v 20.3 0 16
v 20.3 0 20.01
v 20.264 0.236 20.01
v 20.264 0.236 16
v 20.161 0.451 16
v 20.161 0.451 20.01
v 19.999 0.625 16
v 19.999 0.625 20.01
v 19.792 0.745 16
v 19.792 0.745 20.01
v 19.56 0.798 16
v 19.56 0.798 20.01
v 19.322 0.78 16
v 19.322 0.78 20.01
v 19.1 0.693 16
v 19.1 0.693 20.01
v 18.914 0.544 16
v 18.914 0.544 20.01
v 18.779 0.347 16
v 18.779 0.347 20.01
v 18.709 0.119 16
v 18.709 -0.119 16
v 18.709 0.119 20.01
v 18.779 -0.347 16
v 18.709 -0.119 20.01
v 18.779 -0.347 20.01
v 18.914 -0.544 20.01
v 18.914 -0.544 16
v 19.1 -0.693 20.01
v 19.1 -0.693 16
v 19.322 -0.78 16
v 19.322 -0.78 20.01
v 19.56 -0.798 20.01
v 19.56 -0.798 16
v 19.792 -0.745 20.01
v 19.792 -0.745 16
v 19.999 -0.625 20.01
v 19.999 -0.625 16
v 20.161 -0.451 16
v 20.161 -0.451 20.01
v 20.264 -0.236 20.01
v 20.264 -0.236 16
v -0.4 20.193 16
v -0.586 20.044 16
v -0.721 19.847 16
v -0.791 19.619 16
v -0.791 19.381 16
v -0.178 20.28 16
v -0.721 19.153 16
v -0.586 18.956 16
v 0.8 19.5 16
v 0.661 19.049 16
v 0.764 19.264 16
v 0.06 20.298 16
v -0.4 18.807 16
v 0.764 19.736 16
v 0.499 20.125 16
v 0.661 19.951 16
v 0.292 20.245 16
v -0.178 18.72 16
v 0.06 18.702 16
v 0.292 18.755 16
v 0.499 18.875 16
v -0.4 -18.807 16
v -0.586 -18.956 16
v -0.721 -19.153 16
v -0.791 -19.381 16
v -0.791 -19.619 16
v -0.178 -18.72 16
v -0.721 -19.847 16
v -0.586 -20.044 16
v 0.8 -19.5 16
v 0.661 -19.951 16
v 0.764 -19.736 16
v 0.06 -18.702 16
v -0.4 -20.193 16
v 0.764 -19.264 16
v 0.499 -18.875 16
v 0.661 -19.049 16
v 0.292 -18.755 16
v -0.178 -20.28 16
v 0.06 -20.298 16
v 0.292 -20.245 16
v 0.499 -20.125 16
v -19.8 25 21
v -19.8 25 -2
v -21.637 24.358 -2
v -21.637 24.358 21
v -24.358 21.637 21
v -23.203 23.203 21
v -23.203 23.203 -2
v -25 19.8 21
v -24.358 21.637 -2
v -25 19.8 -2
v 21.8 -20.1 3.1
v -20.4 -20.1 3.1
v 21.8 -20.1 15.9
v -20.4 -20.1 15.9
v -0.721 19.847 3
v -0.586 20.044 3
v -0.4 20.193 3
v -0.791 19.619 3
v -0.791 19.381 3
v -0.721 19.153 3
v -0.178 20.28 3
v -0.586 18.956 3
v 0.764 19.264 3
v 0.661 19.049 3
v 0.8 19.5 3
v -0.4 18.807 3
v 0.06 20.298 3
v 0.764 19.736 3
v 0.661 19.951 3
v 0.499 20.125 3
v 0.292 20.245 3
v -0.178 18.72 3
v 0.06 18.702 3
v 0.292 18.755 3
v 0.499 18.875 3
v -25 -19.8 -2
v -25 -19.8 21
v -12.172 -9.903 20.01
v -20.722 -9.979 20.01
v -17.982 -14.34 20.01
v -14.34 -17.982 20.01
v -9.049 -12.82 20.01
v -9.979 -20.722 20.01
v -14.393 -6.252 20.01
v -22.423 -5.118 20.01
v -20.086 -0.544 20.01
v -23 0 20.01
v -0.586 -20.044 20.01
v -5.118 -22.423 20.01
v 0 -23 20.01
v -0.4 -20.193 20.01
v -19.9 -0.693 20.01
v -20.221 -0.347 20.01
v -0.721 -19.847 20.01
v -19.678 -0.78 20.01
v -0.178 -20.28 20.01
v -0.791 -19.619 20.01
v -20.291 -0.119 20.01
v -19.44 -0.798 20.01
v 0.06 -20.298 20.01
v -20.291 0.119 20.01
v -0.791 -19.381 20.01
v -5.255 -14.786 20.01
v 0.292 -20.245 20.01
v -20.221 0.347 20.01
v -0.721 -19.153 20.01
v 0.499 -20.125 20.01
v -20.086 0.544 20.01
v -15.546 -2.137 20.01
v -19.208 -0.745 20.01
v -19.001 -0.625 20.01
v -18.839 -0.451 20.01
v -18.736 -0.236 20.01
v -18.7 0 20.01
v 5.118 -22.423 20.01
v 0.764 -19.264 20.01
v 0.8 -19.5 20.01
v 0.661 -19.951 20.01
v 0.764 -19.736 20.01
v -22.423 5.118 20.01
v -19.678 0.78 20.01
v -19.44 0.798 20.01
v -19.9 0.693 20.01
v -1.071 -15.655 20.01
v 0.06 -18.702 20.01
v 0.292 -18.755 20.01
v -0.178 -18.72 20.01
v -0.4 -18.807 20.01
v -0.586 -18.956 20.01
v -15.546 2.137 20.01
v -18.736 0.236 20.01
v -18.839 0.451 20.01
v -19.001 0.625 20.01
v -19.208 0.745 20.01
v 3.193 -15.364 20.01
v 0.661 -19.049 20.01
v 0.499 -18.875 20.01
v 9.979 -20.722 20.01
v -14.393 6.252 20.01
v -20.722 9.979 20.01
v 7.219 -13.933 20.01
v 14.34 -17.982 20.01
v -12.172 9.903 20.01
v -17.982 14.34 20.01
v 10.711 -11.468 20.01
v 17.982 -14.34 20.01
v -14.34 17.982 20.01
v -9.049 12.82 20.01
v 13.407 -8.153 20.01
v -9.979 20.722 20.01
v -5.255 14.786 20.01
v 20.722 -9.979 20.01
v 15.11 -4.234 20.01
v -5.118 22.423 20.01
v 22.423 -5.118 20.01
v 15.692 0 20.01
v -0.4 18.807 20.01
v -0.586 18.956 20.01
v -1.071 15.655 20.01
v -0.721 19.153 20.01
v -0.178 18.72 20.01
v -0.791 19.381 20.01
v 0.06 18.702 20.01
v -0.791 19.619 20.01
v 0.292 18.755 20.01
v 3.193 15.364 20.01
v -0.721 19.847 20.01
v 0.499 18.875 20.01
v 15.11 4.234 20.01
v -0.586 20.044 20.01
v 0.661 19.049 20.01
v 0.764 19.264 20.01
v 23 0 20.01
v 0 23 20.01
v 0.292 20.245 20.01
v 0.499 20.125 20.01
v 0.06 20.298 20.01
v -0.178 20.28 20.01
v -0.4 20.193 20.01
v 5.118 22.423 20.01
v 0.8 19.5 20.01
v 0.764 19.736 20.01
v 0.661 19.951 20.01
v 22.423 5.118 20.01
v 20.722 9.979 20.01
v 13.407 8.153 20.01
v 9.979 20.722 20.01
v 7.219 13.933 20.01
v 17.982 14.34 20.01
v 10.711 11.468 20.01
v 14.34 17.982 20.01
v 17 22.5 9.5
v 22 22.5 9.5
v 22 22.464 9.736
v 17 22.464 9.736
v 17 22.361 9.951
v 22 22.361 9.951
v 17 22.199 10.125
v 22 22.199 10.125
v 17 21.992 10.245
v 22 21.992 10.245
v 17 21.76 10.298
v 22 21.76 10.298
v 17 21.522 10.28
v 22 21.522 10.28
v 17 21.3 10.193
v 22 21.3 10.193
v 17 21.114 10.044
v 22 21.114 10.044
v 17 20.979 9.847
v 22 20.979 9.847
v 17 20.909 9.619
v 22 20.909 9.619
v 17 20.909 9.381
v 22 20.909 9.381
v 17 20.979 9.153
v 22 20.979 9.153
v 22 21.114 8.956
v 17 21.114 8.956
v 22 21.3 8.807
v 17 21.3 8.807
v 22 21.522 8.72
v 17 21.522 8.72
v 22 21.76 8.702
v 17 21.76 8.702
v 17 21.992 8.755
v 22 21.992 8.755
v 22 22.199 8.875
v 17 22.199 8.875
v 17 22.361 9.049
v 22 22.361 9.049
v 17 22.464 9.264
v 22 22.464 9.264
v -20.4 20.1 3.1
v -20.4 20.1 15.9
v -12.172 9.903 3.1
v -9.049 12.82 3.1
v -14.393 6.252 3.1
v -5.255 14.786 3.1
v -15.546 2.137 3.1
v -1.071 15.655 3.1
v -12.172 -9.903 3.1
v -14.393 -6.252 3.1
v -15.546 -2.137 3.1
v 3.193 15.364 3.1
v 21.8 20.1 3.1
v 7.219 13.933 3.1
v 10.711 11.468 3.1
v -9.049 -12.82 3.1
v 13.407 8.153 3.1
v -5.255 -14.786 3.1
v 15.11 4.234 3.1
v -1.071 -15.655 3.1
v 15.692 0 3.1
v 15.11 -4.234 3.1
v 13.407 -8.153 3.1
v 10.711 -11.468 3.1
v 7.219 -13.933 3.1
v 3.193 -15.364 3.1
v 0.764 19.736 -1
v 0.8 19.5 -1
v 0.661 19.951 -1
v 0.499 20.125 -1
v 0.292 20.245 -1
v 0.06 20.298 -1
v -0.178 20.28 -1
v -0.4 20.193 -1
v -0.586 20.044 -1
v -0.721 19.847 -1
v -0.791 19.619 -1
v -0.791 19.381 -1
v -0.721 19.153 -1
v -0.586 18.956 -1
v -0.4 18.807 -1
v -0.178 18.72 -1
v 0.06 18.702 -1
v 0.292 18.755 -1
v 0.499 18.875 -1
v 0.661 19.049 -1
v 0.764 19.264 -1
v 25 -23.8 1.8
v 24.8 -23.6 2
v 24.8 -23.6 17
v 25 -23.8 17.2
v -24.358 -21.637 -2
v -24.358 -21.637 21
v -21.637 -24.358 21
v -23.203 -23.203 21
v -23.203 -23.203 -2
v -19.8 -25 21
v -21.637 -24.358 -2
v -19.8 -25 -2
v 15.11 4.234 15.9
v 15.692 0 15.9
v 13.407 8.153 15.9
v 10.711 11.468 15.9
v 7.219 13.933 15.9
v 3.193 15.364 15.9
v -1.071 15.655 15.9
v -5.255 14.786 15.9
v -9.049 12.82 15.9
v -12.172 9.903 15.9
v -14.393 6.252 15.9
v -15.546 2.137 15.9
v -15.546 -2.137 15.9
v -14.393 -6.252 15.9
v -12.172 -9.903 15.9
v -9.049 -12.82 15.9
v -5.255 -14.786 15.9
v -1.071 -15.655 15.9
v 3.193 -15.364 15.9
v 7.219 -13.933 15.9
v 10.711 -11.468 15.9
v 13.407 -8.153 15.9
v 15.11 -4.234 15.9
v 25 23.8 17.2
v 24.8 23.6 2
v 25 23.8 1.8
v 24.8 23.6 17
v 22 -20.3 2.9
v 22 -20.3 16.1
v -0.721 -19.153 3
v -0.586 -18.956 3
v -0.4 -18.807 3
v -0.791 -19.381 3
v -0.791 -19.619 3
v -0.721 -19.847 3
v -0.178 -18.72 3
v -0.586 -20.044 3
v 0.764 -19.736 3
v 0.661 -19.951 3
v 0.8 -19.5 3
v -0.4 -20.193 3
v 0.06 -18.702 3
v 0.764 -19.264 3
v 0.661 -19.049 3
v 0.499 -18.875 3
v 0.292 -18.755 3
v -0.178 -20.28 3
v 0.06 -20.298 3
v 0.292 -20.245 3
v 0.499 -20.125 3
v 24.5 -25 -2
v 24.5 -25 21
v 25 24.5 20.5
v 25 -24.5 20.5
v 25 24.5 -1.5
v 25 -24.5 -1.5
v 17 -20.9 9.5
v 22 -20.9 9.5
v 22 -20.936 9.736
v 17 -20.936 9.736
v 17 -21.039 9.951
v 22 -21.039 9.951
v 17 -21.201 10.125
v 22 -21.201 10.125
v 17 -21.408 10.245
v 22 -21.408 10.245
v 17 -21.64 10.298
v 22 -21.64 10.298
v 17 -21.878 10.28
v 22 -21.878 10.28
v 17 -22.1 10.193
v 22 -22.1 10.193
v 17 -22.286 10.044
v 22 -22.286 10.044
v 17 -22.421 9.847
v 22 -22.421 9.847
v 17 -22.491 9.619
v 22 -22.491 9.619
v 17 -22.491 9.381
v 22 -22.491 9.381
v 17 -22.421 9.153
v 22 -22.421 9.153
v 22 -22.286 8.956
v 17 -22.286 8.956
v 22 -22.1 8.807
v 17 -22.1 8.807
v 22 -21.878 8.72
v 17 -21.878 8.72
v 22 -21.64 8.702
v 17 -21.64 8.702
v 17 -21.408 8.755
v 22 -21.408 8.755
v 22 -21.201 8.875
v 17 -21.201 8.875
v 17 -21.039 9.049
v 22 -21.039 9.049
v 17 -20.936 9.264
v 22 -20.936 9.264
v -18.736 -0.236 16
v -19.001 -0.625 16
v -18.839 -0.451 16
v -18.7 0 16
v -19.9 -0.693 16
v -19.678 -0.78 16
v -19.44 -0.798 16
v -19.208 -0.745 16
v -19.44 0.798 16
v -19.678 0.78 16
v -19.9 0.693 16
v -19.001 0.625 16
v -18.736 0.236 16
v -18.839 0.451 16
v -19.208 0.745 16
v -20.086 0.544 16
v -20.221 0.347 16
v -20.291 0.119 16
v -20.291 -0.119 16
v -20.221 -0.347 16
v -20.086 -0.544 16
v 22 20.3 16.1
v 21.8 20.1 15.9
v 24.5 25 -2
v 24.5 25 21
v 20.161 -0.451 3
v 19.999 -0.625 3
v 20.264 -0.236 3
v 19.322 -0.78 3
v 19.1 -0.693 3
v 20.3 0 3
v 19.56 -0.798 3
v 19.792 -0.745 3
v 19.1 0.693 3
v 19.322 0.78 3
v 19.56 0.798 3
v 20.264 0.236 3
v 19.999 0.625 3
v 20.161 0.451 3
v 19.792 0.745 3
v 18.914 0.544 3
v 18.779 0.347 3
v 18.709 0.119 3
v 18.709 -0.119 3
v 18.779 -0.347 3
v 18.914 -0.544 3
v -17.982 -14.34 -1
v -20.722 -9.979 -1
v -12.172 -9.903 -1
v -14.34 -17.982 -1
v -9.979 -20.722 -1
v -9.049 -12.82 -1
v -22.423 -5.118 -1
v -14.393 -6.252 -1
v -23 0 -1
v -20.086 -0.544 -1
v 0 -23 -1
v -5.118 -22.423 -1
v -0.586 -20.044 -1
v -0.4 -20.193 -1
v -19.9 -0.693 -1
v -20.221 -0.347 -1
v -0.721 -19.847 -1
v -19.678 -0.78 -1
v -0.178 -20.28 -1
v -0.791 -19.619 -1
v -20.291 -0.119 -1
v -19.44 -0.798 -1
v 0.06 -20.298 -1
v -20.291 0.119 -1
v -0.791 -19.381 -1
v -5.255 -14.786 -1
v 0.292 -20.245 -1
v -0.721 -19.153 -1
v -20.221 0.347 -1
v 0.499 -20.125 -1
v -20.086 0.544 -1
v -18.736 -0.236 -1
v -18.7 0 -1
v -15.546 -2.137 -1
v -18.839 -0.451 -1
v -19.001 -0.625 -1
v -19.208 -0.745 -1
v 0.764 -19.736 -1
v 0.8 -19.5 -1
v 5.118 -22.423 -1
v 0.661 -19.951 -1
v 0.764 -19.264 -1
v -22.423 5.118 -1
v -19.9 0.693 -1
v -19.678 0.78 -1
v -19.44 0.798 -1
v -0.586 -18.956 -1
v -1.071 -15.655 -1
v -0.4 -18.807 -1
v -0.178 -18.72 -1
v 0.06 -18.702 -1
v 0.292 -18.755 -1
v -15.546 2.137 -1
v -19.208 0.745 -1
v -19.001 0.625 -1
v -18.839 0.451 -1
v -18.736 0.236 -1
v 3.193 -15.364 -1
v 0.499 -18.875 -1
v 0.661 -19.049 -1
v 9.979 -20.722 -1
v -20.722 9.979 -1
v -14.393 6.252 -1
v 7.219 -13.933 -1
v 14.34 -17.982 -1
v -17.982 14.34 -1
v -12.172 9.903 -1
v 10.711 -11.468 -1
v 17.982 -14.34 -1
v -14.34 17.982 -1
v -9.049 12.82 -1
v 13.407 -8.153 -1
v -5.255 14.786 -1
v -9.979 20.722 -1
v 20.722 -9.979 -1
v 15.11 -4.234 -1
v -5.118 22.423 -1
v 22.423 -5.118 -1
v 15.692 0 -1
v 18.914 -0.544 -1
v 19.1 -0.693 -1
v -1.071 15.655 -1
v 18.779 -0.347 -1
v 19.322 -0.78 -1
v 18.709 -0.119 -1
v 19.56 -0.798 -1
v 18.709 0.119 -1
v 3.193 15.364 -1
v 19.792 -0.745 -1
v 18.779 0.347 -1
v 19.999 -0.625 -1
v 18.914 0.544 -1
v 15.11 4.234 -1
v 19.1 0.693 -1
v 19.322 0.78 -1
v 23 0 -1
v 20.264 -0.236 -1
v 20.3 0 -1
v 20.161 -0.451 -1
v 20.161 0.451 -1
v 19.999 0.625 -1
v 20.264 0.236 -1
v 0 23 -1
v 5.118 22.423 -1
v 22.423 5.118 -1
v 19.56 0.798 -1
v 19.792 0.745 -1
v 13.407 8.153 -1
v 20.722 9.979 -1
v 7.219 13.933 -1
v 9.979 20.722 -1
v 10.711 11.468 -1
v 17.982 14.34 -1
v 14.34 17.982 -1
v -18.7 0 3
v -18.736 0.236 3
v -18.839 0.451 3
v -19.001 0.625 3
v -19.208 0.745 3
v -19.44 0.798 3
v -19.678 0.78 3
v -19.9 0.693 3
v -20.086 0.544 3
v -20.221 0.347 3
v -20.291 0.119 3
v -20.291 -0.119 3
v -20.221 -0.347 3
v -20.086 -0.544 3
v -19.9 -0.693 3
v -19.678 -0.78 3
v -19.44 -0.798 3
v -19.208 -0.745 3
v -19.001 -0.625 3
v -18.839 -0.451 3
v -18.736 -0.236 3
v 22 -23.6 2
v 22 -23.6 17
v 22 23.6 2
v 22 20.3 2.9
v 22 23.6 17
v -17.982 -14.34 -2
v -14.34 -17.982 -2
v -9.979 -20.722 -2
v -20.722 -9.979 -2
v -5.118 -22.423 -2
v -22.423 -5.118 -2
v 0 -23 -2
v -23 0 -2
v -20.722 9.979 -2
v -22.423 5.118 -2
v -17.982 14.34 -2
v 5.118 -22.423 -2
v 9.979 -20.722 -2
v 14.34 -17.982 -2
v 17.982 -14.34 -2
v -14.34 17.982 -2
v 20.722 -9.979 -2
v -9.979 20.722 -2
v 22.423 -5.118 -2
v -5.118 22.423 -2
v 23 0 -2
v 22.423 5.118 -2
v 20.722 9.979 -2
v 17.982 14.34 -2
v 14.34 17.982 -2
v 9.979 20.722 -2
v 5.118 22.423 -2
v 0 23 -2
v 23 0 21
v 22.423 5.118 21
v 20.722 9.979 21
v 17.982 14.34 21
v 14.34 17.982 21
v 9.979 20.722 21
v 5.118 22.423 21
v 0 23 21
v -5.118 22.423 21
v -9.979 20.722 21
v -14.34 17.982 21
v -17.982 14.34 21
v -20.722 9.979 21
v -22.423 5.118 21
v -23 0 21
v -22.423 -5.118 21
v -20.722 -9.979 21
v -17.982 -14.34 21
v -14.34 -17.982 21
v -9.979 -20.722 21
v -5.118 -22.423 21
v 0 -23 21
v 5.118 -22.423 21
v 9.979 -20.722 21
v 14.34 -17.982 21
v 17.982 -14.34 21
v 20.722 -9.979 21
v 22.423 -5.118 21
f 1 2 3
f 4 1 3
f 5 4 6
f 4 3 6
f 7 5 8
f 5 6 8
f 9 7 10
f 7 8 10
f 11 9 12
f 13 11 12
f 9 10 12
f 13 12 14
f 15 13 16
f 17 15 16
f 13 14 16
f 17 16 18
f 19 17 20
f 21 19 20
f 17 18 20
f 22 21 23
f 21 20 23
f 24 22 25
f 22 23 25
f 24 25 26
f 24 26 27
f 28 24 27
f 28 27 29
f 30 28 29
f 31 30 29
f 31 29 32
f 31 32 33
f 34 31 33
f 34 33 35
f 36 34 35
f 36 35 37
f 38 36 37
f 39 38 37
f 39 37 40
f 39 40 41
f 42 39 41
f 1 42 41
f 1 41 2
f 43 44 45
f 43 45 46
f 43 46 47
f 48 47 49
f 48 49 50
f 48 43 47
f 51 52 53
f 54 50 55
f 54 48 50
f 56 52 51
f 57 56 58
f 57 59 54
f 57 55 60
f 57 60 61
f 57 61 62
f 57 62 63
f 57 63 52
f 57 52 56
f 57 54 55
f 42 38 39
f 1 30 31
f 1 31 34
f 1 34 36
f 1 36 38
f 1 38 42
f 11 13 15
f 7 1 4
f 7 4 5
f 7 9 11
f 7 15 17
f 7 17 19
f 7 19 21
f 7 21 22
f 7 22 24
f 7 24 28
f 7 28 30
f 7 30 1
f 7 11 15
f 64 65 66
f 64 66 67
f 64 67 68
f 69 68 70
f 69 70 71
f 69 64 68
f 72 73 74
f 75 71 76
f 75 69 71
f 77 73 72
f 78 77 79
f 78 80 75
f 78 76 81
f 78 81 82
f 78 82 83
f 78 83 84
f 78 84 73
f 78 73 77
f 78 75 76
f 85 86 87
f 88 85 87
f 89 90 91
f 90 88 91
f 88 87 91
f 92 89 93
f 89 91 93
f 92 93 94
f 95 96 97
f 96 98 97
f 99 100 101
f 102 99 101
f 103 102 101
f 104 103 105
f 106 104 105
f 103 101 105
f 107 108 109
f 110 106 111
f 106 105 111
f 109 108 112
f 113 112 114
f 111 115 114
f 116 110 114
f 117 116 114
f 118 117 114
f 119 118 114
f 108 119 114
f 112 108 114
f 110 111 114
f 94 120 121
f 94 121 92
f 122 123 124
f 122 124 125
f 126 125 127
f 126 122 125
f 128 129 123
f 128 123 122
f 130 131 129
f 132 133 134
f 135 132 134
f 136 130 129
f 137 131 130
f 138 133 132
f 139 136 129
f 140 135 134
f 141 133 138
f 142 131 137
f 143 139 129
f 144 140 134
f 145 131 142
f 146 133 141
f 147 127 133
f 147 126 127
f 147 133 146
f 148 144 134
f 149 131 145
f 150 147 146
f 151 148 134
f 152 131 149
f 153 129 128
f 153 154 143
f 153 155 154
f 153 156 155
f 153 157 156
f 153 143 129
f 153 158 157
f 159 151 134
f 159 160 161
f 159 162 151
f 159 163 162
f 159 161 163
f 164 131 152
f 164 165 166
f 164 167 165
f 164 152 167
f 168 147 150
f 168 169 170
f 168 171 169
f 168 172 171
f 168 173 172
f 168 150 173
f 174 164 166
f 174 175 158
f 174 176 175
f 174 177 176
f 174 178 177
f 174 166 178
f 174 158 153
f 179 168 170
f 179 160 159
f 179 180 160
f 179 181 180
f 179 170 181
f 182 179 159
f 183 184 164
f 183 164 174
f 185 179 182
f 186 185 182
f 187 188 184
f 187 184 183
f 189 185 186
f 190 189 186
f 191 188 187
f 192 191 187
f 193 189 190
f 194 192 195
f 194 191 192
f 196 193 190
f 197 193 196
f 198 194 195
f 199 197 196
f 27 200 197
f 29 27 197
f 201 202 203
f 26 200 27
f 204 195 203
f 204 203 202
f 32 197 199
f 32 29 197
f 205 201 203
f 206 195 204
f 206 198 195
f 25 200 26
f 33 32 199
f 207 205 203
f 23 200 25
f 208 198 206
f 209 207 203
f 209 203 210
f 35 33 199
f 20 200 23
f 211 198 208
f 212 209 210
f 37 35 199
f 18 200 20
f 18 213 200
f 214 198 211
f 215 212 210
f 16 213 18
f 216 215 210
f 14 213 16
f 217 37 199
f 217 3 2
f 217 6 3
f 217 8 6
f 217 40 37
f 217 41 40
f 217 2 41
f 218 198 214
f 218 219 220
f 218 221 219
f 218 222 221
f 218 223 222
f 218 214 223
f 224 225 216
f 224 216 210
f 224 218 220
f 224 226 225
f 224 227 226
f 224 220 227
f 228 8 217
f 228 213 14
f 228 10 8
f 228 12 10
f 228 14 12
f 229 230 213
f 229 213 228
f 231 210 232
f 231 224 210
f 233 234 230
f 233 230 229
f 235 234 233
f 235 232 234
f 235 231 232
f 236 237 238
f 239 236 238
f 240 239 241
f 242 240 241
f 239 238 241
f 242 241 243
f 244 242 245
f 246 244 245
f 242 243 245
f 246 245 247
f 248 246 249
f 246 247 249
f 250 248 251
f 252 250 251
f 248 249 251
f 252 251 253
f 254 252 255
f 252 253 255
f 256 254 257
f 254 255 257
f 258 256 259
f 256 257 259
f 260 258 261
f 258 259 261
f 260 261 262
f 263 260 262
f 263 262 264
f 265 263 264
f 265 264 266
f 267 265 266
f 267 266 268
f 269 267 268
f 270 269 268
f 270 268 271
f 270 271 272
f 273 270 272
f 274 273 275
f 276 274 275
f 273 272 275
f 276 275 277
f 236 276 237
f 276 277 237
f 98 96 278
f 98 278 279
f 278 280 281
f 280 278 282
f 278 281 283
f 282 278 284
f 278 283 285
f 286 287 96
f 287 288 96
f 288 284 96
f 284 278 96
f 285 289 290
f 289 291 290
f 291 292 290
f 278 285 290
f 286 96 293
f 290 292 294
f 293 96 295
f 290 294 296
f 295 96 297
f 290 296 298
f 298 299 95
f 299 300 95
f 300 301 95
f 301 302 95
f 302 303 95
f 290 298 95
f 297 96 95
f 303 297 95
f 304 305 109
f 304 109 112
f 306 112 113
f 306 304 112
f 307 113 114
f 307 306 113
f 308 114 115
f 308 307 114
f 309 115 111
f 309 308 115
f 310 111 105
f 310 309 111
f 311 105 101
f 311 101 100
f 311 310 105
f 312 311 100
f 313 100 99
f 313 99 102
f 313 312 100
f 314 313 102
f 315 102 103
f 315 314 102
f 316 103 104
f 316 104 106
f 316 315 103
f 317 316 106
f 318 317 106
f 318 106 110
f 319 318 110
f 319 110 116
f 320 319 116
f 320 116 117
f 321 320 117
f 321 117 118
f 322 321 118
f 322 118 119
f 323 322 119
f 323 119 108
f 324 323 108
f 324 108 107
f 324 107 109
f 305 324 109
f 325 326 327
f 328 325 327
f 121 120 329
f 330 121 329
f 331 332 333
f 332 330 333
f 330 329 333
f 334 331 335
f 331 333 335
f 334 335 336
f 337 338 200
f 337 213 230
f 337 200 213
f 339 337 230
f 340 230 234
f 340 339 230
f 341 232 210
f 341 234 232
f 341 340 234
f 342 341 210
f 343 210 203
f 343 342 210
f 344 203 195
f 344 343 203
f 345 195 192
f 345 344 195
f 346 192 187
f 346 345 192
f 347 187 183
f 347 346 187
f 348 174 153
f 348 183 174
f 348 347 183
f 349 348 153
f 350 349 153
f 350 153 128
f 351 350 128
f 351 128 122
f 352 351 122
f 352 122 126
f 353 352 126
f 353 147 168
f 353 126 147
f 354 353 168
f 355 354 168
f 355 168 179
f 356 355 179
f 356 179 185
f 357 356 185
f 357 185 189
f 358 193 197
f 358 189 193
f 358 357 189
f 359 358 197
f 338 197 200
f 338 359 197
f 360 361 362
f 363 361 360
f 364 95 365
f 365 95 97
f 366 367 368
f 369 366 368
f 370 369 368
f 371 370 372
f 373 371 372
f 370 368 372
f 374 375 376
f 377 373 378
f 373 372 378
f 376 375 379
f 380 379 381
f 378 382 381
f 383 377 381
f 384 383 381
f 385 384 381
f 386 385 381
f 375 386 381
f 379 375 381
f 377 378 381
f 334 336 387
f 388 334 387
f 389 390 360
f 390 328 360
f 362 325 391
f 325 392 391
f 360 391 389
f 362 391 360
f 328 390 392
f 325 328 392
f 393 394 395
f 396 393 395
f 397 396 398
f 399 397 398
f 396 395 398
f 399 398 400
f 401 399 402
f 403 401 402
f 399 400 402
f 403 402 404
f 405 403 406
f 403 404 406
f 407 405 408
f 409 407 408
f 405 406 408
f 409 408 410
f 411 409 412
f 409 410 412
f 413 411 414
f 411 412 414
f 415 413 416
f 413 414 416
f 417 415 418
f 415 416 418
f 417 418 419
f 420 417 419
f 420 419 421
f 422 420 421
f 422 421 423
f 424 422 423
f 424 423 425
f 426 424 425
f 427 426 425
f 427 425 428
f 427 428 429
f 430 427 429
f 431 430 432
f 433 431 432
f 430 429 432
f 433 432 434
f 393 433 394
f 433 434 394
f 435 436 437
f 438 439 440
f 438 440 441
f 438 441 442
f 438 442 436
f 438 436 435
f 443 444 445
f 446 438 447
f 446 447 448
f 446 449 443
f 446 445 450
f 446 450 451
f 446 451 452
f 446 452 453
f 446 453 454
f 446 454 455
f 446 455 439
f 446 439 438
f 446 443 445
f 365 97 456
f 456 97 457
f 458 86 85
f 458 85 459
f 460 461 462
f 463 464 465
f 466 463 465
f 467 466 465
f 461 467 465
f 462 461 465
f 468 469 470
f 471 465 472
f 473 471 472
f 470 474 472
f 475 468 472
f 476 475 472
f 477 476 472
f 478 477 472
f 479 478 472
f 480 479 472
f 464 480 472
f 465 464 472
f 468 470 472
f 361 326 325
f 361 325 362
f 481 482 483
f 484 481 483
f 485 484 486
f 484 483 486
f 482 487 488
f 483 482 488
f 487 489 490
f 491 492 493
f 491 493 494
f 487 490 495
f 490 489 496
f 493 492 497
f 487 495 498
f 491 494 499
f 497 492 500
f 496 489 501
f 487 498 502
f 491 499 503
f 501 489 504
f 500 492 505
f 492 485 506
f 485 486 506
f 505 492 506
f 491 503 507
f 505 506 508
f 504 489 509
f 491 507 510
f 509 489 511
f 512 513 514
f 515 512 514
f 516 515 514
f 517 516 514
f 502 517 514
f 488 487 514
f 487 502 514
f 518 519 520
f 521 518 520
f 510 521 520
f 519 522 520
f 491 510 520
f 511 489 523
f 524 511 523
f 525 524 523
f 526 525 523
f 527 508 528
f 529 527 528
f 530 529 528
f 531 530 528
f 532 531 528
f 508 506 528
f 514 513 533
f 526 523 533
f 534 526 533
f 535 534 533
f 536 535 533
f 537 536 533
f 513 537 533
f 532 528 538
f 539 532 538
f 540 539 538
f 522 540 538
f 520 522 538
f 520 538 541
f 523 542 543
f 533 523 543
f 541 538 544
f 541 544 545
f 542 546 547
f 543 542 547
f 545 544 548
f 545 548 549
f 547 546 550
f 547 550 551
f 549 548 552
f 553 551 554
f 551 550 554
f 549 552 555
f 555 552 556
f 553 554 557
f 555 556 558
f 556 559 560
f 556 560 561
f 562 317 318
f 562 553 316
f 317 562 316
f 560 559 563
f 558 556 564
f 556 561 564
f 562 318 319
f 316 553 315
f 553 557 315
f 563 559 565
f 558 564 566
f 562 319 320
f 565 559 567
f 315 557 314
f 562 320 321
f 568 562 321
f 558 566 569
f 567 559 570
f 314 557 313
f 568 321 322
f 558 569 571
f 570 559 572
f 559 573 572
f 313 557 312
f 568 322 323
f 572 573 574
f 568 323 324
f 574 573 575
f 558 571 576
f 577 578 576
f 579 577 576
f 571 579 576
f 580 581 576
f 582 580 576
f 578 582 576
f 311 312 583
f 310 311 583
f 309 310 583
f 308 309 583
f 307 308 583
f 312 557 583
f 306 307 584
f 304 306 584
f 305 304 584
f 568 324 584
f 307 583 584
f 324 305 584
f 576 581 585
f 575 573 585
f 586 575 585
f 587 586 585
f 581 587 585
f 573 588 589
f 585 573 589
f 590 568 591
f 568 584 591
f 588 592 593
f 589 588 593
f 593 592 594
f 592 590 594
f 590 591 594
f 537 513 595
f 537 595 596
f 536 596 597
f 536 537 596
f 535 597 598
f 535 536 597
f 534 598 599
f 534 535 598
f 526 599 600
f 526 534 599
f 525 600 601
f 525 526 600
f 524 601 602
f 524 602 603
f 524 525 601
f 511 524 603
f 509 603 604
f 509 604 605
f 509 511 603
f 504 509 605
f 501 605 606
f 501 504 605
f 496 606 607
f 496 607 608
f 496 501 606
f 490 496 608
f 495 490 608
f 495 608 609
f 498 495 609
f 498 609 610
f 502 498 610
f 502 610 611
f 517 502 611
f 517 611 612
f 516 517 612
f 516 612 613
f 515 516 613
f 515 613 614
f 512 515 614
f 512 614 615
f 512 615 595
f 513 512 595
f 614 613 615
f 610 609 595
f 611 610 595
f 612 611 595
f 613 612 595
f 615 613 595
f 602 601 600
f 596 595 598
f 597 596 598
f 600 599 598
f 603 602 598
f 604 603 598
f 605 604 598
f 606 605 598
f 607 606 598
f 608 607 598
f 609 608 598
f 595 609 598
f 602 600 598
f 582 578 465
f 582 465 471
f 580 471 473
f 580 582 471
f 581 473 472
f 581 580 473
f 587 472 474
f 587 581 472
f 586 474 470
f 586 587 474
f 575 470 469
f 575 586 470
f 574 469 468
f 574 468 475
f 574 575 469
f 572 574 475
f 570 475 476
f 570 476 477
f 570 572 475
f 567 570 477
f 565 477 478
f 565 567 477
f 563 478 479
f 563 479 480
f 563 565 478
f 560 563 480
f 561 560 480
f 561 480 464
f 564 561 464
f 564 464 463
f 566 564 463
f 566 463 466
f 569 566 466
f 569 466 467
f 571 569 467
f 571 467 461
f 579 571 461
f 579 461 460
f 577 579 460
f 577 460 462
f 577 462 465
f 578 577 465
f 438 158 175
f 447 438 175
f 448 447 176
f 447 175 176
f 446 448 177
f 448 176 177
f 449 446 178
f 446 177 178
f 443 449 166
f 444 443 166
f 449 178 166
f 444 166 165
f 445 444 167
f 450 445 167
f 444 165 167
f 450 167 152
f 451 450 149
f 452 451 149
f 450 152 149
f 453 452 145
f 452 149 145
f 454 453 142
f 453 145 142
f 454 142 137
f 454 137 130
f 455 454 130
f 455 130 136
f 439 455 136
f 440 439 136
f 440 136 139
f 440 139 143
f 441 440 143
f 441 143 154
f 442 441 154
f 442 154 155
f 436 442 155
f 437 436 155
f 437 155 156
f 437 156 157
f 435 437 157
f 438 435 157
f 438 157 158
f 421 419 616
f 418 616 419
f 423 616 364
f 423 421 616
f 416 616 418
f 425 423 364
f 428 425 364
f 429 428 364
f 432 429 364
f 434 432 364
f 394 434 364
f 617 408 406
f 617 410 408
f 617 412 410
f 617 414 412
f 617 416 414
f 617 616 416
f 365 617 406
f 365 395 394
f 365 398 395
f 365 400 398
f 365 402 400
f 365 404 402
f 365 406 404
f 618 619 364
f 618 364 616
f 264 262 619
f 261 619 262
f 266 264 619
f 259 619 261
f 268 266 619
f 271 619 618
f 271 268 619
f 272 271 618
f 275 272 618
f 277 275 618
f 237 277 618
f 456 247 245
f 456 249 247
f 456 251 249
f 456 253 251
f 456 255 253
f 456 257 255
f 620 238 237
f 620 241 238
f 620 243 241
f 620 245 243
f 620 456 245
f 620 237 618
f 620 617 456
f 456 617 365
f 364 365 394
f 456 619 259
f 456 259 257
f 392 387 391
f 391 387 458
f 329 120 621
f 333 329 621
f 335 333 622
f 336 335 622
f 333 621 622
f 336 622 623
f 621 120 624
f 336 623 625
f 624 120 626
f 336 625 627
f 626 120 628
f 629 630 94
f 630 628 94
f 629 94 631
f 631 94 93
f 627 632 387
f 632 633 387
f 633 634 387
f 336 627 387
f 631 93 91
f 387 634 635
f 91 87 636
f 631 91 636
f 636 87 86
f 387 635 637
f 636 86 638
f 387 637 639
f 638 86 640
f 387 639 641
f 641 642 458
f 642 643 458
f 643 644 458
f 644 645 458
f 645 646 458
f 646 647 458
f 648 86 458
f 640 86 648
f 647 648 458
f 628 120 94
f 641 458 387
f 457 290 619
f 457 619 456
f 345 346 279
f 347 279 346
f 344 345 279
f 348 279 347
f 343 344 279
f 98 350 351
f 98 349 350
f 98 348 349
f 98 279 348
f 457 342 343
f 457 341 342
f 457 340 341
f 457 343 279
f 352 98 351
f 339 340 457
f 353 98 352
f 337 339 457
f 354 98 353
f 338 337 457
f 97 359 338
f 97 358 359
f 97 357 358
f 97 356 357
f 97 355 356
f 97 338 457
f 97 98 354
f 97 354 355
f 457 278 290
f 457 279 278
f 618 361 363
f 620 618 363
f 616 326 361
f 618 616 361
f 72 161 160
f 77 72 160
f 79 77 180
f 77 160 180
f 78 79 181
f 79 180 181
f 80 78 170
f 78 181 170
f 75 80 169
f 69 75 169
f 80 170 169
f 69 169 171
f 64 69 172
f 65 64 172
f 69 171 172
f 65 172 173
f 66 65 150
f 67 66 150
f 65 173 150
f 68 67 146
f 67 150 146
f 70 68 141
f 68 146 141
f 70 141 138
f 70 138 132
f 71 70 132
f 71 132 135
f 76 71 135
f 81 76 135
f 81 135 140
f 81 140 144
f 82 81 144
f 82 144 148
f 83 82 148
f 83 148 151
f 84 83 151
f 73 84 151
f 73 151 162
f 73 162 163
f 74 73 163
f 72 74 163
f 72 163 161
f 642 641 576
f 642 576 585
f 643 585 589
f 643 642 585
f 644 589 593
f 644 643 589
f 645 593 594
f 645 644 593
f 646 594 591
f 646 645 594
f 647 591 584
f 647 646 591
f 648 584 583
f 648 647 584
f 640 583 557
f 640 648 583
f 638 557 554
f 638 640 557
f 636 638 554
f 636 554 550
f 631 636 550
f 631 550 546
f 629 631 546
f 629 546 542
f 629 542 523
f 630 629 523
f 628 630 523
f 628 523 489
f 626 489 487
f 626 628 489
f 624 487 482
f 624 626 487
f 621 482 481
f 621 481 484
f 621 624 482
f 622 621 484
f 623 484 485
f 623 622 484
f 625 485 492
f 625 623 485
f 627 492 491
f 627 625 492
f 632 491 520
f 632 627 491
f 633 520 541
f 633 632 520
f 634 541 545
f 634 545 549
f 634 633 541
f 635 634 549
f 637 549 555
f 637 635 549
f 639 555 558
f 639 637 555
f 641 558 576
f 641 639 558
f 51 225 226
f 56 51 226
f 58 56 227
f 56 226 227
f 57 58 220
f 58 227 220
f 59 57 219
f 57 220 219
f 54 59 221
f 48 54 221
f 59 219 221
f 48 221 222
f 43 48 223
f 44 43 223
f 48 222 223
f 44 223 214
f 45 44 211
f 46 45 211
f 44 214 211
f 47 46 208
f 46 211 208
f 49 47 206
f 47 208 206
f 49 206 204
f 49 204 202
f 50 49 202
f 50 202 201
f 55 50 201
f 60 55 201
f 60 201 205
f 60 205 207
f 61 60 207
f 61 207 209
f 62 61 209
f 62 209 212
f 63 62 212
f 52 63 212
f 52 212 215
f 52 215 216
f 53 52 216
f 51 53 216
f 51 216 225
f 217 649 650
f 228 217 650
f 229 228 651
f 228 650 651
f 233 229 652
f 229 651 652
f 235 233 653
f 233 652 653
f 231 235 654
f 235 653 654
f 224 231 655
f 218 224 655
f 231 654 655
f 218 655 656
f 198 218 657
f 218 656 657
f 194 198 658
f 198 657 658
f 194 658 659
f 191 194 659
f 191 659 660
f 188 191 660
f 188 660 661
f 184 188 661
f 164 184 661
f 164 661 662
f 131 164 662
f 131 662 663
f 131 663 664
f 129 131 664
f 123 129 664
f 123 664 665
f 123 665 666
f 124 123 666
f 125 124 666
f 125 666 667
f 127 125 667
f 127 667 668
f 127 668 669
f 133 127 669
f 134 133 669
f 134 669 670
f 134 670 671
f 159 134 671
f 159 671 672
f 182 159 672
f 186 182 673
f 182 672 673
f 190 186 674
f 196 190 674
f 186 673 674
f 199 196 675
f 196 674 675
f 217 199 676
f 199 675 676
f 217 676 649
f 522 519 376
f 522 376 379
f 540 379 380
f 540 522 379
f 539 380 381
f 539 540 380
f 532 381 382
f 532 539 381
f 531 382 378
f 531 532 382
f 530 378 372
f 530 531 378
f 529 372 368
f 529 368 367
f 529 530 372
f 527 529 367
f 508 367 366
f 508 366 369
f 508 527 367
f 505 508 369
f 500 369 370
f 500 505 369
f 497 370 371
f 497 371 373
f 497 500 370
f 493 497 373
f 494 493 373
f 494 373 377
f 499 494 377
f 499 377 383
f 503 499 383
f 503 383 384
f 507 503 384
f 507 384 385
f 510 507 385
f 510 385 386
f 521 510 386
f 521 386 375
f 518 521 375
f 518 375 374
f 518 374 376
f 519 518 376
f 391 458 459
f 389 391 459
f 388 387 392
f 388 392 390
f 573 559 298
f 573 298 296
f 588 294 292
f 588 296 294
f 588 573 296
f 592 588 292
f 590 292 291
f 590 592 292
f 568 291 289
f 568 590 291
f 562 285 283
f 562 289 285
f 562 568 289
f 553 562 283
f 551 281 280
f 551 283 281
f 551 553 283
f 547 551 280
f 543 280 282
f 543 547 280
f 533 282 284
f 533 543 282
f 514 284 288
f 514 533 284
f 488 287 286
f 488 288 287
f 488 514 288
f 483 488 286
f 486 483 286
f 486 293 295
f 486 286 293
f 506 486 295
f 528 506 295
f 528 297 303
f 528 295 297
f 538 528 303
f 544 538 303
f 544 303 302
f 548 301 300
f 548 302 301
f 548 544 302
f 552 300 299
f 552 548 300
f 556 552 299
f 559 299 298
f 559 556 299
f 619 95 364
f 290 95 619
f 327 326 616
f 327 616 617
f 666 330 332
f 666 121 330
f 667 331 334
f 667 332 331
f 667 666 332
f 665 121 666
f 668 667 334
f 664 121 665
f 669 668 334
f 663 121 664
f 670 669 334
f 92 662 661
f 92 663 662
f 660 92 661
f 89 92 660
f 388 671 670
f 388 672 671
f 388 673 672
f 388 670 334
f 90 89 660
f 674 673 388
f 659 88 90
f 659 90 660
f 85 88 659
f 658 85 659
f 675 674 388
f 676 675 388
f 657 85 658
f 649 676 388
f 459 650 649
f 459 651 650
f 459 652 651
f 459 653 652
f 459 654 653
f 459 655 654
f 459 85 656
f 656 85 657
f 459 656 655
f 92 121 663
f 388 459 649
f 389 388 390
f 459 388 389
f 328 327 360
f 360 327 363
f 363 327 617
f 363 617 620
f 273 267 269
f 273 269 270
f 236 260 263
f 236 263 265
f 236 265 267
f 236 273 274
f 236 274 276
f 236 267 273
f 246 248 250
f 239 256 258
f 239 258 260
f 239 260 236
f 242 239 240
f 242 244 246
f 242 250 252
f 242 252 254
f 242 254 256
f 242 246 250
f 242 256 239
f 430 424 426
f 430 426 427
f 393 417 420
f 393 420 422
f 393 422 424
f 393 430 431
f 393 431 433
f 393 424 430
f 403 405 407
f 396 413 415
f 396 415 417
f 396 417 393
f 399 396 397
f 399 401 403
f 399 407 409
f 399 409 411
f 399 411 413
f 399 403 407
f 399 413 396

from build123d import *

# Parameters (mm, degrees)
SKETCH005_W     = 50
SKETCH005_H     = 50
SKETCH005_R     = 15.69193
PAD_DEPTH       = 23
SKETCH006_W     = 40.8
SKETCH006_H     = 12.8
POCKET_DEPTH    = 40.2
SKETCH011_W     = 47.2
SKETCH011_H     = 15
POCKET001_DEPTH = 3
SKETCH012_R     = 0.8
SKETCH012_W     = 40.2
SKETCH012_H     = 12.8
POCKET002_DEPTH = 5
SKETCH020_R     = 23
POCKET007_DEPTH = 1
SKETCH021_R     = 23
POCKET008_DEPTH = 1
SKETCH022_R     = 0.8
POCKET009_DEPTH = 5
SKETCH023_R     = 0.8
POCKET010_DEPTH = 5
POCKET015_DEPTH = 23.001
CHAMFER012_SIZE = 0.2
CHAMFER_SIZE    = 0.5


with BuildPart() as part:
    # Sketch005 → Pad (new body)
    with BuildSketch(Plane.XY):
        Rectangle(SKETCH005_W, SKETCH005_H)
        Circle(SKETCH005_R, mode=Mode.SUBTRACT)
    extrude(amount=PAD_DEPTH)

    # Sketch006 → Pocket (cut)
    with BuildSketch(Plane.XZ.offset(20.1)):
        with Locations((0, 11.5)):
            Rectangle(SKETCH006_W, SKETCH006_H)
    extrude(amount=-POCKET_DEPTH, mode=Mode.SUBTRACT)

    # Sketch011 → Pocket001 (cut)
    with BuildSketch(Plane.YZ.offset(25)):
        with Locations((0, 11.5)):
            Rectangle(SKETCH011_W, SKETCH011_H)
    extrude(amount=-POCKET001_DEPTH, mode=Mode.SUBTRACT)

    # Sketch012 → Pocket002 (cut)
    with BuildSketch(Plane.YZ.offset(22)):
        with Locations((-21.7, 11.5)):
            Circle(SKETCH012_R)
        with Locations((21.7, 11.5)):
            Circle(SKETCH012_R)
        with Locations((0, 11.5)):
            Rectangle(SKETCH012_W, SKETCH012_H)
    extrude(amount=-POCKET002_DEPTH, mode=Mode.SUBTRACT)

    # Sketch020 → Pocket007 (cut)
    with BuildSketch(Plane.XY):
        Circle(SKETCH020_R)
    extrude(amount=POCKET007_DEPTH, mode=Mode.SUBTRACT)

    # Sketch021 → Pocket008 (cut)
    with BuildSketch(Plane.XY.offset(23.01)):
        Circle(SKETCH021_R)
    extrude(amount=-POCKET008_DEPTH, mode=Mode.SUBTRACT)

    # Sketch022 → Pocket009 (cut)
    with BuildSketch(Plane.XY):
        with Locations((-19.5, 0)):
            Circle(SKETCH022_R)
        with Locations((0, -19.5)):
            Circle(SKETCH022_R)
        with Locations((19.5, 0)):
            Circle(SKETCH022_R)
        with Locations((0, 19.5)):
            Circle(SKETCH022_R)
    extrude(amount=POCKET009_DEPTH, mode=Mode.SUBTRACT)

    # Sketch023 → Pocket010 (cut)
    with BuildSketch(Plane.XY.offset(23)):
        with Locations((-19.5, 0)):
            Circle(SKETCH023_R)
        with Locations((0, -19.5)):
            Circle(SKETCH023_R)
        with Locations((19.5, 0)):
            Circle(SKETCH023_R)
        with Locations((0, 19.5)):
            Circle(SKETCH023_R)
    extrude(amount=-POCKET010_DEPTH, mode=Mode.SUBTRACT)

    # Sketch033 → Pocket015 (cut, through all)
    with BuildSketch(Plane.XY):
        with BuildLine():
            Line((-19, 25.1), (-25.1, 25.1))
            Line((-25.1, 19), (-25.1, 25.1))
            ThreePointArc((-19, 25.1), (-23.203288, 23.203288), (-25.1, 19))
        make_face()
        with BuildLine():
            Line((-25.1, -19), (-25.1, -25.1))
            Line((-19, -25.1), (-25.1, -25.1))
            ThreePointArc((-25.1, -19), (-23.203288, -23.203288), (-19, -25.1))
        make_face()
    extrude(amount=POCKET015_DEPTH, mode=Mode.SUBTRACT)

    # Chamfer012
    chamfer012_edges = [part.edges().sort_by_distance(p)[0] for p in [
        (22, 0, 5.1),
        (22, 20.1, 11.5),
        (22, 0, 17.9),
        (22, -20.1, 11.5),
        (25, -23.6, 11.5),
        (25, 0, 4),
        (25, 23.6, 11.5),
        (25, 0, 19),
    ]]
    chamfer(chamfer012_edges, length=CHAMFER012_SIZE)

    # Chamfer
    chamfer_edges = [part.edges().sort_by_distance(p)[0] for p in [
        (25, 25, 11.5),
        (25, 0, 0),
        (25, 0, 23),
        (25, -25, 11.5),
    ]]
    chamfer(chamfer_edges, length=CHAMFER_SIZE)


with BuildPart() as part_1:
    # Body002 placement: moved
    add(part.part.moved(Location((0, 0, -2))))


solid = part_1.part
